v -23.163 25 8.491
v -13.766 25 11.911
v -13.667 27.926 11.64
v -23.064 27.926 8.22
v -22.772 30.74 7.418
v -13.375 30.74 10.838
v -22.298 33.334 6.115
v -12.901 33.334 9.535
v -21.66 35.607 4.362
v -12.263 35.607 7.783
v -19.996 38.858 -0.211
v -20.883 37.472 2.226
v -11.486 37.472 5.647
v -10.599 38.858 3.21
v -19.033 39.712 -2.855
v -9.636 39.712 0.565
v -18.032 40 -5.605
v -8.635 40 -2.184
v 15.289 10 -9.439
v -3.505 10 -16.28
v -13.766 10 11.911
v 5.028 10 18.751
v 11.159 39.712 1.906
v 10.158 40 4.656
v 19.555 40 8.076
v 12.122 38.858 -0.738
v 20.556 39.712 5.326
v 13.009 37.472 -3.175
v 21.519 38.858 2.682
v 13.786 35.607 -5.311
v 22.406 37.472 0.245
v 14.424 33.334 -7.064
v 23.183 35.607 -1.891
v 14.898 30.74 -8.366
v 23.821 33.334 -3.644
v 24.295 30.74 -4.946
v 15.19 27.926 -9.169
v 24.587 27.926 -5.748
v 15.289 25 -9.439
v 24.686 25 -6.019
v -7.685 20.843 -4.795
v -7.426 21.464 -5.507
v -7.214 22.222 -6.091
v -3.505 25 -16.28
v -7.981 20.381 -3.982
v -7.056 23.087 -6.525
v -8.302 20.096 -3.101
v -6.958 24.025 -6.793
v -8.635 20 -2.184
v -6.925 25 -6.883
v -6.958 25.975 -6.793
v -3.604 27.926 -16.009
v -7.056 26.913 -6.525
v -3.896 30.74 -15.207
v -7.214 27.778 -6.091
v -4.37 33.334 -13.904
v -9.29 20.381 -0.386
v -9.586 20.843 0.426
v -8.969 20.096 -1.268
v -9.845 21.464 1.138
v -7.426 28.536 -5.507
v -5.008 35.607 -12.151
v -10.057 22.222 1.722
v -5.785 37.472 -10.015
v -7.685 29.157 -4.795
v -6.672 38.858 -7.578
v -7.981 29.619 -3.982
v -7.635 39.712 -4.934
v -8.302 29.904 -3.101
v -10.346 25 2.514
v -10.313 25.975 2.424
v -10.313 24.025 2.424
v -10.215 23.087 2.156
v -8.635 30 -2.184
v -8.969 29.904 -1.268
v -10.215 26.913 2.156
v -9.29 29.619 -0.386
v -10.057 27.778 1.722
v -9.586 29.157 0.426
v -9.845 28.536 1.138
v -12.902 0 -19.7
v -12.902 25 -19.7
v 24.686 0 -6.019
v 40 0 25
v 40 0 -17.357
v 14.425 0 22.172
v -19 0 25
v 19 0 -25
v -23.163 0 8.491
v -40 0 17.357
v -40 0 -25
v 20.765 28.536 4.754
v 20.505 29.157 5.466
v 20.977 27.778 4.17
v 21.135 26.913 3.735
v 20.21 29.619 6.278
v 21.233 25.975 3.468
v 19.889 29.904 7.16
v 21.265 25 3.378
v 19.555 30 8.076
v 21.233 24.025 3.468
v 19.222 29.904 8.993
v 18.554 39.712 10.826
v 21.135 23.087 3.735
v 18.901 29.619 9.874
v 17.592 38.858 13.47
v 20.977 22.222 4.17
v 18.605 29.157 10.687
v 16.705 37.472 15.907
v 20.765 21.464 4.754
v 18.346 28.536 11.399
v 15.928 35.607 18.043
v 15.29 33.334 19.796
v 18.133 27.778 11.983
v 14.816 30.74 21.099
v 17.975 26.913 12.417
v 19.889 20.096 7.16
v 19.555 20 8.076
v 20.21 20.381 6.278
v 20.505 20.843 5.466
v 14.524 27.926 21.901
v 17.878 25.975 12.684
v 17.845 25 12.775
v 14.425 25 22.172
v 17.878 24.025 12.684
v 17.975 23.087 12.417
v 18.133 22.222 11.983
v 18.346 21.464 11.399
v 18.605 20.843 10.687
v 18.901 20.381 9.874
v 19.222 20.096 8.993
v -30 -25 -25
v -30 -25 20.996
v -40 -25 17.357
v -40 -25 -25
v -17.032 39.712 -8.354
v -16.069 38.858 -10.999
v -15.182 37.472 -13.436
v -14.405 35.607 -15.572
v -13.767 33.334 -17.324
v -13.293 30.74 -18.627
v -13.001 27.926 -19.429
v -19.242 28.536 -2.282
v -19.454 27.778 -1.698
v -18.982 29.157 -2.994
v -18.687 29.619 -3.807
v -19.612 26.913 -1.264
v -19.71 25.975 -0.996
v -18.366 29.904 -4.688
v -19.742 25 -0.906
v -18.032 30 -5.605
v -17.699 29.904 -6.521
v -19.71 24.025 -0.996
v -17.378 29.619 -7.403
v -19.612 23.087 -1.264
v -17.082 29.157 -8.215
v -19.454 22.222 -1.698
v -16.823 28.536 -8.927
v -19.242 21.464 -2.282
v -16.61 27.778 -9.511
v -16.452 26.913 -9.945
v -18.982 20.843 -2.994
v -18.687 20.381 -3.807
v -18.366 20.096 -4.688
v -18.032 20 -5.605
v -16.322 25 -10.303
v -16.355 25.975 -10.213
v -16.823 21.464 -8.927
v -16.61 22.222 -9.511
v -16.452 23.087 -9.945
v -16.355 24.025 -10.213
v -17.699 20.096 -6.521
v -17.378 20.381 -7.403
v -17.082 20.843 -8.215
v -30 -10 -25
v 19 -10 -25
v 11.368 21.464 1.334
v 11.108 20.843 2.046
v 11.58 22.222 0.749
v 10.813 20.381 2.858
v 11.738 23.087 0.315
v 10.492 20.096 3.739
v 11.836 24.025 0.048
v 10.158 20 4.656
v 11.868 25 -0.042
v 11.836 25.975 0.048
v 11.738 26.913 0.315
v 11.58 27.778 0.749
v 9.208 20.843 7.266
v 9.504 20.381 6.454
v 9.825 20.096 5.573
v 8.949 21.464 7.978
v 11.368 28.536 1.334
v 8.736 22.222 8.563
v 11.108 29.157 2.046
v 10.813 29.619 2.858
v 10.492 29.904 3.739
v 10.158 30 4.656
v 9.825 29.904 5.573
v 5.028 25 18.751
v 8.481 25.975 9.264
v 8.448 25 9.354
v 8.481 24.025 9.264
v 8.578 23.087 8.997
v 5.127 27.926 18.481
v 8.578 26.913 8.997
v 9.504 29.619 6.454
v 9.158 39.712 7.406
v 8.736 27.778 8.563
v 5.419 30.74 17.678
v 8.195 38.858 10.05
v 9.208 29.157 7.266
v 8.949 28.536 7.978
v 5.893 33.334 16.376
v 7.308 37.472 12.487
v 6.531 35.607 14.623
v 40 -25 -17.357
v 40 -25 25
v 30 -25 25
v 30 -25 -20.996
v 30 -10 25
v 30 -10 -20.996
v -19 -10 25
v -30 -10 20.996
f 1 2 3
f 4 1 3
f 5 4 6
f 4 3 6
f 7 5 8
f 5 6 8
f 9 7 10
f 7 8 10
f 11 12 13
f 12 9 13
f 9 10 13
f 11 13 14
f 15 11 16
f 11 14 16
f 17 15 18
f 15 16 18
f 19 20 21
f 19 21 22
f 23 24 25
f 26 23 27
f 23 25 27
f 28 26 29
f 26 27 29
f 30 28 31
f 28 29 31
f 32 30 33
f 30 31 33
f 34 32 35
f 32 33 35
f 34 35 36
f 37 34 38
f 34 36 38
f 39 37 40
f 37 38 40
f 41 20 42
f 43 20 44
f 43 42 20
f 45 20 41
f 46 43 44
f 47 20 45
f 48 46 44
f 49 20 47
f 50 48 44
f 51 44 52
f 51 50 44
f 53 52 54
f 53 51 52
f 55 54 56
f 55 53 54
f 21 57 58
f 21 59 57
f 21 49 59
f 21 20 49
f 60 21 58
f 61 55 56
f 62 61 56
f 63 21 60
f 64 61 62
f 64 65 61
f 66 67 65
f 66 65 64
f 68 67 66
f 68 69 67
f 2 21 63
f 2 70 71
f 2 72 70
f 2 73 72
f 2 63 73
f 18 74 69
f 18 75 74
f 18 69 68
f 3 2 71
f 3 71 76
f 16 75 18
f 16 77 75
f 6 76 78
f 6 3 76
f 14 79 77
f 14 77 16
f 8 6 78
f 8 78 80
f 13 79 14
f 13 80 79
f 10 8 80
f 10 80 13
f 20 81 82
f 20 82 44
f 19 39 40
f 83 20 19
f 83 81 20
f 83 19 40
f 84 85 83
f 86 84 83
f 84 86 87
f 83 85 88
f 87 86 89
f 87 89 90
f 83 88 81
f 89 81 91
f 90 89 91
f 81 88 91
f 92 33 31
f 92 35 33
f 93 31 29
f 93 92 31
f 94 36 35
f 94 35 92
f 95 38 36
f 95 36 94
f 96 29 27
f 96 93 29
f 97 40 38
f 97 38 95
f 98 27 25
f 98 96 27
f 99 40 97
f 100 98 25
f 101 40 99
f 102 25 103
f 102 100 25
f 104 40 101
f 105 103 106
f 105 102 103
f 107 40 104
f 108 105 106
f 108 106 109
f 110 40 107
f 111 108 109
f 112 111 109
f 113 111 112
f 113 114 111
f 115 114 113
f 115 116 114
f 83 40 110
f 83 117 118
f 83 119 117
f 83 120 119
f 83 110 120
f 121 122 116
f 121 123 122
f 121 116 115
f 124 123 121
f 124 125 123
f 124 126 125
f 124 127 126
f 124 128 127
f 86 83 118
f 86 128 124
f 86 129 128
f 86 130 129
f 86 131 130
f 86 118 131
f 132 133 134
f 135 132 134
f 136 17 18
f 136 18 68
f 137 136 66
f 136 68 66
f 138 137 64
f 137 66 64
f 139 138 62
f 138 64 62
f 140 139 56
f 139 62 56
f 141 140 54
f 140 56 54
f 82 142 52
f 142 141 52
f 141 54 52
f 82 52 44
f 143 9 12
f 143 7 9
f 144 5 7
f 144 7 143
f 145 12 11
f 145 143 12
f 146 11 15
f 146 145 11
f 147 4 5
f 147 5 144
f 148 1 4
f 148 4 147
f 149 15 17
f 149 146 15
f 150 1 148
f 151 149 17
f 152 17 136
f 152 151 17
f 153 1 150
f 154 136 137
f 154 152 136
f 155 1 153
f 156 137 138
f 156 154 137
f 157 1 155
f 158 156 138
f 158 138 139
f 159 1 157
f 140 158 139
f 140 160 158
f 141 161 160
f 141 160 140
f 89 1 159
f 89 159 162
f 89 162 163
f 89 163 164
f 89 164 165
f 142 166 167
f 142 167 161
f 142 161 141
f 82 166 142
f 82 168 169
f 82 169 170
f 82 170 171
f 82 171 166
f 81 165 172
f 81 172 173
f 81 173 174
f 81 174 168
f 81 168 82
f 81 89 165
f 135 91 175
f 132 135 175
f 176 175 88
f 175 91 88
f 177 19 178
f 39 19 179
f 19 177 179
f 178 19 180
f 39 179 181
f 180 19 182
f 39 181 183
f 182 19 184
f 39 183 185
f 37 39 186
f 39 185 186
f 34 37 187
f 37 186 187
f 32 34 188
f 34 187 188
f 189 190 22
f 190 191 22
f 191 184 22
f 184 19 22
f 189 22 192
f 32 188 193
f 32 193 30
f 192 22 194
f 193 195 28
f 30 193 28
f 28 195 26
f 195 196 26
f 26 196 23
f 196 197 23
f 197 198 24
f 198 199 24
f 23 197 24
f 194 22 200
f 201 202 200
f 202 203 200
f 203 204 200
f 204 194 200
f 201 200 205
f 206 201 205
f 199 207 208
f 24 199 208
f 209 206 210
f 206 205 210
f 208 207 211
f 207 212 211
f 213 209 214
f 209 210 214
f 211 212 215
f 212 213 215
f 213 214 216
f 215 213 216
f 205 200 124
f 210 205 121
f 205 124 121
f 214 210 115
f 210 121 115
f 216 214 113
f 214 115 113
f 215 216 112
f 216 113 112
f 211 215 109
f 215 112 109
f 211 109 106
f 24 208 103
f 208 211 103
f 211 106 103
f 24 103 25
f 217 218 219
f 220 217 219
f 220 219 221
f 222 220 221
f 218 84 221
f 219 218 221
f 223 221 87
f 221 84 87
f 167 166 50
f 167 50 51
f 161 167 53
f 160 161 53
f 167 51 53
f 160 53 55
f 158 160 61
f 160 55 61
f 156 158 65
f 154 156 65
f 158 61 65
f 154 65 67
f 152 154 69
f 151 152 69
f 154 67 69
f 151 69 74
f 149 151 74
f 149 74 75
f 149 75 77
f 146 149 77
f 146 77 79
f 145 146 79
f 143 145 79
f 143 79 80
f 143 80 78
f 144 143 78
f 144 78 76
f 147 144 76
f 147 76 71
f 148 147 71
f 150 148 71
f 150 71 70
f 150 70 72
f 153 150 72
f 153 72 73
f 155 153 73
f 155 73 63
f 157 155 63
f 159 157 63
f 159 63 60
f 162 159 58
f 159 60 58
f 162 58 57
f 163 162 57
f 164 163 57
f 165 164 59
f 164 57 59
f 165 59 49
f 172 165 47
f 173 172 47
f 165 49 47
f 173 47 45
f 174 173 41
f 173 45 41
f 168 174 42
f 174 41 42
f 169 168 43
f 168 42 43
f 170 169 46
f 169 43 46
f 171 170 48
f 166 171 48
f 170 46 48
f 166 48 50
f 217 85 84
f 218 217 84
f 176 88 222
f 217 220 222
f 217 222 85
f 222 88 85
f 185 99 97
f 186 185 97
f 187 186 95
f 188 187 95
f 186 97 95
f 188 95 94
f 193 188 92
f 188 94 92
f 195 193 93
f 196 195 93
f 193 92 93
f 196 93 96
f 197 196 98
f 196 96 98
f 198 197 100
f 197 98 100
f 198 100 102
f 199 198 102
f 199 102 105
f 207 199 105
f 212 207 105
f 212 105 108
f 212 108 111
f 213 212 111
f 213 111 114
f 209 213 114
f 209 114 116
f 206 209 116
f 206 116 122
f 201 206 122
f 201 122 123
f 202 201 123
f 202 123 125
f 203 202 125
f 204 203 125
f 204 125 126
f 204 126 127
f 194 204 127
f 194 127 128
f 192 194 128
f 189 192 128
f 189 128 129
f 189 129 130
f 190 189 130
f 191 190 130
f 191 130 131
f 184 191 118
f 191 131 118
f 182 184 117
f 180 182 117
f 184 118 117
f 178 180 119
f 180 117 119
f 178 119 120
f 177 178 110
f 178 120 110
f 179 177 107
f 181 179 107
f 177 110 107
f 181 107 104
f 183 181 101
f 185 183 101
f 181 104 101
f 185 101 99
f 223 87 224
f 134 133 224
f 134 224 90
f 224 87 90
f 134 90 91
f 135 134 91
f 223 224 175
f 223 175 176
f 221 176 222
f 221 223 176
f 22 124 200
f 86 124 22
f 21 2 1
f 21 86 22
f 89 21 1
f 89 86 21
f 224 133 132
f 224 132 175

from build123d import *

# Parameters (mm, degrees)
EXTRUDE_1_DEPTH     = 25
SKETCH_2_W          = 60
SKETCH_2_H          = 15
CUT_EXTRUDE_1_DEPTH = 69.738635424
EXTRUDE_2_DEPTH     = 40
SKETCH_4_R          = 5
CUT_EXTRUDE_2_DEPTH = 79.882076454
SKETCH_5_W          = 20
SKETCH_5_H          = 30
CUT_EXTRUDE_3_DEPTH = 40


with BuildPart() as part:
    # Эскиз1 → Бобышка-Вытянуть1 (new body)
    with BuildSketch(Plane(origin=(0, 0, 0), x_dir=(1, 0, 0), z_dir=(0, 1, 0))):
        Polygon((-40, 25), (19, 25), (40, 17.35662508), (40, -25), (-19, -25), (-40, -17.35662508), align=None)
    extrude(amount=-EXTRUDE_1_DEPTH)

    # Эскиз2 → Вырез-Вытянуть1 (cut, through all)
    with BuildSketch(Plane.XY.offset(25)):
        with Locations((0, -17.5)):
            Rectangle(SKETCH_2_W, SKETCH_2_H)
    extrude(amount=-CUT_EXTRUDE_1_DEPTH, mode=Mode.SUBTRACT)

    # Эскиз3 → Бобышка-Вытянуть2 (add)
    with BuildSketch(Plane(origin=(0, 0, 0), x_dir=(1, 0, 0), z_dir=(0, 1, 0))):
        Polygon((-12.902085739, 19.7), (24.685619092, 6.019194267), (14.425014792, -22.171584357), (-23.162690039, -8.490778624), align=None)
    extrude(amount=EXTRUDE_2_DEPTH)

    # Эскиз4 → Вырез-Вытянуть2 (cut, through all)
    with BuildSketch(Plane(origin=(19.863418464, 0, 7.229693072), x_dir=(0.34202014332567277, 0, -0.939692620785907), z_dir=(0.939692620785907, 0, 0.34202014332567277))):
        with BuildLine():
            Line((-15.900828584, 40), (-15.900828584, 25))
            ThreePointArc((-15.900828584, 25), (-11.507430302, 35.606601718), (-0.900828584, 40))
            Line((-0.900828584, 40), (-15.900828584, 40))
        make_face()
        with BuildLine():
            Line((14.099171416, 40), (-0.900828584, 40))
            ThreePointArc((-0.900828584, 40), (9.705773134, 35.606601718), (14.099171416, 25))
            Line((14.099171416, 25), (14.099171416, 40))
        make_face()
        with Locations((-0.900828584, 25)):
            Circle(SKETCH_4_R)
    extrude(amount=-CUT_EXTRUDE_2_DEPTH, mode=Mode.SUBTRACT)

    # Эскиз5 → Вырез-Вытянуть3 (cut)
    with BuildSketch(Plane(origin=(-5.438403671, 0, 14.941891285), x_dir=(0.9396926207859105, 0, 0.34202014332566305), z_dir=(-0.34202014332566305, 0, 0.9396926207859105))):
        with Locations((1.138208415, 25)):
            Rectangle(SKETCH_5_W, SKETCH_5_H)
    extrude(amount=-CUT_EXTRUDE_3_DEPTH, mode=Mode.SUBTRACT)


solid = part.part
